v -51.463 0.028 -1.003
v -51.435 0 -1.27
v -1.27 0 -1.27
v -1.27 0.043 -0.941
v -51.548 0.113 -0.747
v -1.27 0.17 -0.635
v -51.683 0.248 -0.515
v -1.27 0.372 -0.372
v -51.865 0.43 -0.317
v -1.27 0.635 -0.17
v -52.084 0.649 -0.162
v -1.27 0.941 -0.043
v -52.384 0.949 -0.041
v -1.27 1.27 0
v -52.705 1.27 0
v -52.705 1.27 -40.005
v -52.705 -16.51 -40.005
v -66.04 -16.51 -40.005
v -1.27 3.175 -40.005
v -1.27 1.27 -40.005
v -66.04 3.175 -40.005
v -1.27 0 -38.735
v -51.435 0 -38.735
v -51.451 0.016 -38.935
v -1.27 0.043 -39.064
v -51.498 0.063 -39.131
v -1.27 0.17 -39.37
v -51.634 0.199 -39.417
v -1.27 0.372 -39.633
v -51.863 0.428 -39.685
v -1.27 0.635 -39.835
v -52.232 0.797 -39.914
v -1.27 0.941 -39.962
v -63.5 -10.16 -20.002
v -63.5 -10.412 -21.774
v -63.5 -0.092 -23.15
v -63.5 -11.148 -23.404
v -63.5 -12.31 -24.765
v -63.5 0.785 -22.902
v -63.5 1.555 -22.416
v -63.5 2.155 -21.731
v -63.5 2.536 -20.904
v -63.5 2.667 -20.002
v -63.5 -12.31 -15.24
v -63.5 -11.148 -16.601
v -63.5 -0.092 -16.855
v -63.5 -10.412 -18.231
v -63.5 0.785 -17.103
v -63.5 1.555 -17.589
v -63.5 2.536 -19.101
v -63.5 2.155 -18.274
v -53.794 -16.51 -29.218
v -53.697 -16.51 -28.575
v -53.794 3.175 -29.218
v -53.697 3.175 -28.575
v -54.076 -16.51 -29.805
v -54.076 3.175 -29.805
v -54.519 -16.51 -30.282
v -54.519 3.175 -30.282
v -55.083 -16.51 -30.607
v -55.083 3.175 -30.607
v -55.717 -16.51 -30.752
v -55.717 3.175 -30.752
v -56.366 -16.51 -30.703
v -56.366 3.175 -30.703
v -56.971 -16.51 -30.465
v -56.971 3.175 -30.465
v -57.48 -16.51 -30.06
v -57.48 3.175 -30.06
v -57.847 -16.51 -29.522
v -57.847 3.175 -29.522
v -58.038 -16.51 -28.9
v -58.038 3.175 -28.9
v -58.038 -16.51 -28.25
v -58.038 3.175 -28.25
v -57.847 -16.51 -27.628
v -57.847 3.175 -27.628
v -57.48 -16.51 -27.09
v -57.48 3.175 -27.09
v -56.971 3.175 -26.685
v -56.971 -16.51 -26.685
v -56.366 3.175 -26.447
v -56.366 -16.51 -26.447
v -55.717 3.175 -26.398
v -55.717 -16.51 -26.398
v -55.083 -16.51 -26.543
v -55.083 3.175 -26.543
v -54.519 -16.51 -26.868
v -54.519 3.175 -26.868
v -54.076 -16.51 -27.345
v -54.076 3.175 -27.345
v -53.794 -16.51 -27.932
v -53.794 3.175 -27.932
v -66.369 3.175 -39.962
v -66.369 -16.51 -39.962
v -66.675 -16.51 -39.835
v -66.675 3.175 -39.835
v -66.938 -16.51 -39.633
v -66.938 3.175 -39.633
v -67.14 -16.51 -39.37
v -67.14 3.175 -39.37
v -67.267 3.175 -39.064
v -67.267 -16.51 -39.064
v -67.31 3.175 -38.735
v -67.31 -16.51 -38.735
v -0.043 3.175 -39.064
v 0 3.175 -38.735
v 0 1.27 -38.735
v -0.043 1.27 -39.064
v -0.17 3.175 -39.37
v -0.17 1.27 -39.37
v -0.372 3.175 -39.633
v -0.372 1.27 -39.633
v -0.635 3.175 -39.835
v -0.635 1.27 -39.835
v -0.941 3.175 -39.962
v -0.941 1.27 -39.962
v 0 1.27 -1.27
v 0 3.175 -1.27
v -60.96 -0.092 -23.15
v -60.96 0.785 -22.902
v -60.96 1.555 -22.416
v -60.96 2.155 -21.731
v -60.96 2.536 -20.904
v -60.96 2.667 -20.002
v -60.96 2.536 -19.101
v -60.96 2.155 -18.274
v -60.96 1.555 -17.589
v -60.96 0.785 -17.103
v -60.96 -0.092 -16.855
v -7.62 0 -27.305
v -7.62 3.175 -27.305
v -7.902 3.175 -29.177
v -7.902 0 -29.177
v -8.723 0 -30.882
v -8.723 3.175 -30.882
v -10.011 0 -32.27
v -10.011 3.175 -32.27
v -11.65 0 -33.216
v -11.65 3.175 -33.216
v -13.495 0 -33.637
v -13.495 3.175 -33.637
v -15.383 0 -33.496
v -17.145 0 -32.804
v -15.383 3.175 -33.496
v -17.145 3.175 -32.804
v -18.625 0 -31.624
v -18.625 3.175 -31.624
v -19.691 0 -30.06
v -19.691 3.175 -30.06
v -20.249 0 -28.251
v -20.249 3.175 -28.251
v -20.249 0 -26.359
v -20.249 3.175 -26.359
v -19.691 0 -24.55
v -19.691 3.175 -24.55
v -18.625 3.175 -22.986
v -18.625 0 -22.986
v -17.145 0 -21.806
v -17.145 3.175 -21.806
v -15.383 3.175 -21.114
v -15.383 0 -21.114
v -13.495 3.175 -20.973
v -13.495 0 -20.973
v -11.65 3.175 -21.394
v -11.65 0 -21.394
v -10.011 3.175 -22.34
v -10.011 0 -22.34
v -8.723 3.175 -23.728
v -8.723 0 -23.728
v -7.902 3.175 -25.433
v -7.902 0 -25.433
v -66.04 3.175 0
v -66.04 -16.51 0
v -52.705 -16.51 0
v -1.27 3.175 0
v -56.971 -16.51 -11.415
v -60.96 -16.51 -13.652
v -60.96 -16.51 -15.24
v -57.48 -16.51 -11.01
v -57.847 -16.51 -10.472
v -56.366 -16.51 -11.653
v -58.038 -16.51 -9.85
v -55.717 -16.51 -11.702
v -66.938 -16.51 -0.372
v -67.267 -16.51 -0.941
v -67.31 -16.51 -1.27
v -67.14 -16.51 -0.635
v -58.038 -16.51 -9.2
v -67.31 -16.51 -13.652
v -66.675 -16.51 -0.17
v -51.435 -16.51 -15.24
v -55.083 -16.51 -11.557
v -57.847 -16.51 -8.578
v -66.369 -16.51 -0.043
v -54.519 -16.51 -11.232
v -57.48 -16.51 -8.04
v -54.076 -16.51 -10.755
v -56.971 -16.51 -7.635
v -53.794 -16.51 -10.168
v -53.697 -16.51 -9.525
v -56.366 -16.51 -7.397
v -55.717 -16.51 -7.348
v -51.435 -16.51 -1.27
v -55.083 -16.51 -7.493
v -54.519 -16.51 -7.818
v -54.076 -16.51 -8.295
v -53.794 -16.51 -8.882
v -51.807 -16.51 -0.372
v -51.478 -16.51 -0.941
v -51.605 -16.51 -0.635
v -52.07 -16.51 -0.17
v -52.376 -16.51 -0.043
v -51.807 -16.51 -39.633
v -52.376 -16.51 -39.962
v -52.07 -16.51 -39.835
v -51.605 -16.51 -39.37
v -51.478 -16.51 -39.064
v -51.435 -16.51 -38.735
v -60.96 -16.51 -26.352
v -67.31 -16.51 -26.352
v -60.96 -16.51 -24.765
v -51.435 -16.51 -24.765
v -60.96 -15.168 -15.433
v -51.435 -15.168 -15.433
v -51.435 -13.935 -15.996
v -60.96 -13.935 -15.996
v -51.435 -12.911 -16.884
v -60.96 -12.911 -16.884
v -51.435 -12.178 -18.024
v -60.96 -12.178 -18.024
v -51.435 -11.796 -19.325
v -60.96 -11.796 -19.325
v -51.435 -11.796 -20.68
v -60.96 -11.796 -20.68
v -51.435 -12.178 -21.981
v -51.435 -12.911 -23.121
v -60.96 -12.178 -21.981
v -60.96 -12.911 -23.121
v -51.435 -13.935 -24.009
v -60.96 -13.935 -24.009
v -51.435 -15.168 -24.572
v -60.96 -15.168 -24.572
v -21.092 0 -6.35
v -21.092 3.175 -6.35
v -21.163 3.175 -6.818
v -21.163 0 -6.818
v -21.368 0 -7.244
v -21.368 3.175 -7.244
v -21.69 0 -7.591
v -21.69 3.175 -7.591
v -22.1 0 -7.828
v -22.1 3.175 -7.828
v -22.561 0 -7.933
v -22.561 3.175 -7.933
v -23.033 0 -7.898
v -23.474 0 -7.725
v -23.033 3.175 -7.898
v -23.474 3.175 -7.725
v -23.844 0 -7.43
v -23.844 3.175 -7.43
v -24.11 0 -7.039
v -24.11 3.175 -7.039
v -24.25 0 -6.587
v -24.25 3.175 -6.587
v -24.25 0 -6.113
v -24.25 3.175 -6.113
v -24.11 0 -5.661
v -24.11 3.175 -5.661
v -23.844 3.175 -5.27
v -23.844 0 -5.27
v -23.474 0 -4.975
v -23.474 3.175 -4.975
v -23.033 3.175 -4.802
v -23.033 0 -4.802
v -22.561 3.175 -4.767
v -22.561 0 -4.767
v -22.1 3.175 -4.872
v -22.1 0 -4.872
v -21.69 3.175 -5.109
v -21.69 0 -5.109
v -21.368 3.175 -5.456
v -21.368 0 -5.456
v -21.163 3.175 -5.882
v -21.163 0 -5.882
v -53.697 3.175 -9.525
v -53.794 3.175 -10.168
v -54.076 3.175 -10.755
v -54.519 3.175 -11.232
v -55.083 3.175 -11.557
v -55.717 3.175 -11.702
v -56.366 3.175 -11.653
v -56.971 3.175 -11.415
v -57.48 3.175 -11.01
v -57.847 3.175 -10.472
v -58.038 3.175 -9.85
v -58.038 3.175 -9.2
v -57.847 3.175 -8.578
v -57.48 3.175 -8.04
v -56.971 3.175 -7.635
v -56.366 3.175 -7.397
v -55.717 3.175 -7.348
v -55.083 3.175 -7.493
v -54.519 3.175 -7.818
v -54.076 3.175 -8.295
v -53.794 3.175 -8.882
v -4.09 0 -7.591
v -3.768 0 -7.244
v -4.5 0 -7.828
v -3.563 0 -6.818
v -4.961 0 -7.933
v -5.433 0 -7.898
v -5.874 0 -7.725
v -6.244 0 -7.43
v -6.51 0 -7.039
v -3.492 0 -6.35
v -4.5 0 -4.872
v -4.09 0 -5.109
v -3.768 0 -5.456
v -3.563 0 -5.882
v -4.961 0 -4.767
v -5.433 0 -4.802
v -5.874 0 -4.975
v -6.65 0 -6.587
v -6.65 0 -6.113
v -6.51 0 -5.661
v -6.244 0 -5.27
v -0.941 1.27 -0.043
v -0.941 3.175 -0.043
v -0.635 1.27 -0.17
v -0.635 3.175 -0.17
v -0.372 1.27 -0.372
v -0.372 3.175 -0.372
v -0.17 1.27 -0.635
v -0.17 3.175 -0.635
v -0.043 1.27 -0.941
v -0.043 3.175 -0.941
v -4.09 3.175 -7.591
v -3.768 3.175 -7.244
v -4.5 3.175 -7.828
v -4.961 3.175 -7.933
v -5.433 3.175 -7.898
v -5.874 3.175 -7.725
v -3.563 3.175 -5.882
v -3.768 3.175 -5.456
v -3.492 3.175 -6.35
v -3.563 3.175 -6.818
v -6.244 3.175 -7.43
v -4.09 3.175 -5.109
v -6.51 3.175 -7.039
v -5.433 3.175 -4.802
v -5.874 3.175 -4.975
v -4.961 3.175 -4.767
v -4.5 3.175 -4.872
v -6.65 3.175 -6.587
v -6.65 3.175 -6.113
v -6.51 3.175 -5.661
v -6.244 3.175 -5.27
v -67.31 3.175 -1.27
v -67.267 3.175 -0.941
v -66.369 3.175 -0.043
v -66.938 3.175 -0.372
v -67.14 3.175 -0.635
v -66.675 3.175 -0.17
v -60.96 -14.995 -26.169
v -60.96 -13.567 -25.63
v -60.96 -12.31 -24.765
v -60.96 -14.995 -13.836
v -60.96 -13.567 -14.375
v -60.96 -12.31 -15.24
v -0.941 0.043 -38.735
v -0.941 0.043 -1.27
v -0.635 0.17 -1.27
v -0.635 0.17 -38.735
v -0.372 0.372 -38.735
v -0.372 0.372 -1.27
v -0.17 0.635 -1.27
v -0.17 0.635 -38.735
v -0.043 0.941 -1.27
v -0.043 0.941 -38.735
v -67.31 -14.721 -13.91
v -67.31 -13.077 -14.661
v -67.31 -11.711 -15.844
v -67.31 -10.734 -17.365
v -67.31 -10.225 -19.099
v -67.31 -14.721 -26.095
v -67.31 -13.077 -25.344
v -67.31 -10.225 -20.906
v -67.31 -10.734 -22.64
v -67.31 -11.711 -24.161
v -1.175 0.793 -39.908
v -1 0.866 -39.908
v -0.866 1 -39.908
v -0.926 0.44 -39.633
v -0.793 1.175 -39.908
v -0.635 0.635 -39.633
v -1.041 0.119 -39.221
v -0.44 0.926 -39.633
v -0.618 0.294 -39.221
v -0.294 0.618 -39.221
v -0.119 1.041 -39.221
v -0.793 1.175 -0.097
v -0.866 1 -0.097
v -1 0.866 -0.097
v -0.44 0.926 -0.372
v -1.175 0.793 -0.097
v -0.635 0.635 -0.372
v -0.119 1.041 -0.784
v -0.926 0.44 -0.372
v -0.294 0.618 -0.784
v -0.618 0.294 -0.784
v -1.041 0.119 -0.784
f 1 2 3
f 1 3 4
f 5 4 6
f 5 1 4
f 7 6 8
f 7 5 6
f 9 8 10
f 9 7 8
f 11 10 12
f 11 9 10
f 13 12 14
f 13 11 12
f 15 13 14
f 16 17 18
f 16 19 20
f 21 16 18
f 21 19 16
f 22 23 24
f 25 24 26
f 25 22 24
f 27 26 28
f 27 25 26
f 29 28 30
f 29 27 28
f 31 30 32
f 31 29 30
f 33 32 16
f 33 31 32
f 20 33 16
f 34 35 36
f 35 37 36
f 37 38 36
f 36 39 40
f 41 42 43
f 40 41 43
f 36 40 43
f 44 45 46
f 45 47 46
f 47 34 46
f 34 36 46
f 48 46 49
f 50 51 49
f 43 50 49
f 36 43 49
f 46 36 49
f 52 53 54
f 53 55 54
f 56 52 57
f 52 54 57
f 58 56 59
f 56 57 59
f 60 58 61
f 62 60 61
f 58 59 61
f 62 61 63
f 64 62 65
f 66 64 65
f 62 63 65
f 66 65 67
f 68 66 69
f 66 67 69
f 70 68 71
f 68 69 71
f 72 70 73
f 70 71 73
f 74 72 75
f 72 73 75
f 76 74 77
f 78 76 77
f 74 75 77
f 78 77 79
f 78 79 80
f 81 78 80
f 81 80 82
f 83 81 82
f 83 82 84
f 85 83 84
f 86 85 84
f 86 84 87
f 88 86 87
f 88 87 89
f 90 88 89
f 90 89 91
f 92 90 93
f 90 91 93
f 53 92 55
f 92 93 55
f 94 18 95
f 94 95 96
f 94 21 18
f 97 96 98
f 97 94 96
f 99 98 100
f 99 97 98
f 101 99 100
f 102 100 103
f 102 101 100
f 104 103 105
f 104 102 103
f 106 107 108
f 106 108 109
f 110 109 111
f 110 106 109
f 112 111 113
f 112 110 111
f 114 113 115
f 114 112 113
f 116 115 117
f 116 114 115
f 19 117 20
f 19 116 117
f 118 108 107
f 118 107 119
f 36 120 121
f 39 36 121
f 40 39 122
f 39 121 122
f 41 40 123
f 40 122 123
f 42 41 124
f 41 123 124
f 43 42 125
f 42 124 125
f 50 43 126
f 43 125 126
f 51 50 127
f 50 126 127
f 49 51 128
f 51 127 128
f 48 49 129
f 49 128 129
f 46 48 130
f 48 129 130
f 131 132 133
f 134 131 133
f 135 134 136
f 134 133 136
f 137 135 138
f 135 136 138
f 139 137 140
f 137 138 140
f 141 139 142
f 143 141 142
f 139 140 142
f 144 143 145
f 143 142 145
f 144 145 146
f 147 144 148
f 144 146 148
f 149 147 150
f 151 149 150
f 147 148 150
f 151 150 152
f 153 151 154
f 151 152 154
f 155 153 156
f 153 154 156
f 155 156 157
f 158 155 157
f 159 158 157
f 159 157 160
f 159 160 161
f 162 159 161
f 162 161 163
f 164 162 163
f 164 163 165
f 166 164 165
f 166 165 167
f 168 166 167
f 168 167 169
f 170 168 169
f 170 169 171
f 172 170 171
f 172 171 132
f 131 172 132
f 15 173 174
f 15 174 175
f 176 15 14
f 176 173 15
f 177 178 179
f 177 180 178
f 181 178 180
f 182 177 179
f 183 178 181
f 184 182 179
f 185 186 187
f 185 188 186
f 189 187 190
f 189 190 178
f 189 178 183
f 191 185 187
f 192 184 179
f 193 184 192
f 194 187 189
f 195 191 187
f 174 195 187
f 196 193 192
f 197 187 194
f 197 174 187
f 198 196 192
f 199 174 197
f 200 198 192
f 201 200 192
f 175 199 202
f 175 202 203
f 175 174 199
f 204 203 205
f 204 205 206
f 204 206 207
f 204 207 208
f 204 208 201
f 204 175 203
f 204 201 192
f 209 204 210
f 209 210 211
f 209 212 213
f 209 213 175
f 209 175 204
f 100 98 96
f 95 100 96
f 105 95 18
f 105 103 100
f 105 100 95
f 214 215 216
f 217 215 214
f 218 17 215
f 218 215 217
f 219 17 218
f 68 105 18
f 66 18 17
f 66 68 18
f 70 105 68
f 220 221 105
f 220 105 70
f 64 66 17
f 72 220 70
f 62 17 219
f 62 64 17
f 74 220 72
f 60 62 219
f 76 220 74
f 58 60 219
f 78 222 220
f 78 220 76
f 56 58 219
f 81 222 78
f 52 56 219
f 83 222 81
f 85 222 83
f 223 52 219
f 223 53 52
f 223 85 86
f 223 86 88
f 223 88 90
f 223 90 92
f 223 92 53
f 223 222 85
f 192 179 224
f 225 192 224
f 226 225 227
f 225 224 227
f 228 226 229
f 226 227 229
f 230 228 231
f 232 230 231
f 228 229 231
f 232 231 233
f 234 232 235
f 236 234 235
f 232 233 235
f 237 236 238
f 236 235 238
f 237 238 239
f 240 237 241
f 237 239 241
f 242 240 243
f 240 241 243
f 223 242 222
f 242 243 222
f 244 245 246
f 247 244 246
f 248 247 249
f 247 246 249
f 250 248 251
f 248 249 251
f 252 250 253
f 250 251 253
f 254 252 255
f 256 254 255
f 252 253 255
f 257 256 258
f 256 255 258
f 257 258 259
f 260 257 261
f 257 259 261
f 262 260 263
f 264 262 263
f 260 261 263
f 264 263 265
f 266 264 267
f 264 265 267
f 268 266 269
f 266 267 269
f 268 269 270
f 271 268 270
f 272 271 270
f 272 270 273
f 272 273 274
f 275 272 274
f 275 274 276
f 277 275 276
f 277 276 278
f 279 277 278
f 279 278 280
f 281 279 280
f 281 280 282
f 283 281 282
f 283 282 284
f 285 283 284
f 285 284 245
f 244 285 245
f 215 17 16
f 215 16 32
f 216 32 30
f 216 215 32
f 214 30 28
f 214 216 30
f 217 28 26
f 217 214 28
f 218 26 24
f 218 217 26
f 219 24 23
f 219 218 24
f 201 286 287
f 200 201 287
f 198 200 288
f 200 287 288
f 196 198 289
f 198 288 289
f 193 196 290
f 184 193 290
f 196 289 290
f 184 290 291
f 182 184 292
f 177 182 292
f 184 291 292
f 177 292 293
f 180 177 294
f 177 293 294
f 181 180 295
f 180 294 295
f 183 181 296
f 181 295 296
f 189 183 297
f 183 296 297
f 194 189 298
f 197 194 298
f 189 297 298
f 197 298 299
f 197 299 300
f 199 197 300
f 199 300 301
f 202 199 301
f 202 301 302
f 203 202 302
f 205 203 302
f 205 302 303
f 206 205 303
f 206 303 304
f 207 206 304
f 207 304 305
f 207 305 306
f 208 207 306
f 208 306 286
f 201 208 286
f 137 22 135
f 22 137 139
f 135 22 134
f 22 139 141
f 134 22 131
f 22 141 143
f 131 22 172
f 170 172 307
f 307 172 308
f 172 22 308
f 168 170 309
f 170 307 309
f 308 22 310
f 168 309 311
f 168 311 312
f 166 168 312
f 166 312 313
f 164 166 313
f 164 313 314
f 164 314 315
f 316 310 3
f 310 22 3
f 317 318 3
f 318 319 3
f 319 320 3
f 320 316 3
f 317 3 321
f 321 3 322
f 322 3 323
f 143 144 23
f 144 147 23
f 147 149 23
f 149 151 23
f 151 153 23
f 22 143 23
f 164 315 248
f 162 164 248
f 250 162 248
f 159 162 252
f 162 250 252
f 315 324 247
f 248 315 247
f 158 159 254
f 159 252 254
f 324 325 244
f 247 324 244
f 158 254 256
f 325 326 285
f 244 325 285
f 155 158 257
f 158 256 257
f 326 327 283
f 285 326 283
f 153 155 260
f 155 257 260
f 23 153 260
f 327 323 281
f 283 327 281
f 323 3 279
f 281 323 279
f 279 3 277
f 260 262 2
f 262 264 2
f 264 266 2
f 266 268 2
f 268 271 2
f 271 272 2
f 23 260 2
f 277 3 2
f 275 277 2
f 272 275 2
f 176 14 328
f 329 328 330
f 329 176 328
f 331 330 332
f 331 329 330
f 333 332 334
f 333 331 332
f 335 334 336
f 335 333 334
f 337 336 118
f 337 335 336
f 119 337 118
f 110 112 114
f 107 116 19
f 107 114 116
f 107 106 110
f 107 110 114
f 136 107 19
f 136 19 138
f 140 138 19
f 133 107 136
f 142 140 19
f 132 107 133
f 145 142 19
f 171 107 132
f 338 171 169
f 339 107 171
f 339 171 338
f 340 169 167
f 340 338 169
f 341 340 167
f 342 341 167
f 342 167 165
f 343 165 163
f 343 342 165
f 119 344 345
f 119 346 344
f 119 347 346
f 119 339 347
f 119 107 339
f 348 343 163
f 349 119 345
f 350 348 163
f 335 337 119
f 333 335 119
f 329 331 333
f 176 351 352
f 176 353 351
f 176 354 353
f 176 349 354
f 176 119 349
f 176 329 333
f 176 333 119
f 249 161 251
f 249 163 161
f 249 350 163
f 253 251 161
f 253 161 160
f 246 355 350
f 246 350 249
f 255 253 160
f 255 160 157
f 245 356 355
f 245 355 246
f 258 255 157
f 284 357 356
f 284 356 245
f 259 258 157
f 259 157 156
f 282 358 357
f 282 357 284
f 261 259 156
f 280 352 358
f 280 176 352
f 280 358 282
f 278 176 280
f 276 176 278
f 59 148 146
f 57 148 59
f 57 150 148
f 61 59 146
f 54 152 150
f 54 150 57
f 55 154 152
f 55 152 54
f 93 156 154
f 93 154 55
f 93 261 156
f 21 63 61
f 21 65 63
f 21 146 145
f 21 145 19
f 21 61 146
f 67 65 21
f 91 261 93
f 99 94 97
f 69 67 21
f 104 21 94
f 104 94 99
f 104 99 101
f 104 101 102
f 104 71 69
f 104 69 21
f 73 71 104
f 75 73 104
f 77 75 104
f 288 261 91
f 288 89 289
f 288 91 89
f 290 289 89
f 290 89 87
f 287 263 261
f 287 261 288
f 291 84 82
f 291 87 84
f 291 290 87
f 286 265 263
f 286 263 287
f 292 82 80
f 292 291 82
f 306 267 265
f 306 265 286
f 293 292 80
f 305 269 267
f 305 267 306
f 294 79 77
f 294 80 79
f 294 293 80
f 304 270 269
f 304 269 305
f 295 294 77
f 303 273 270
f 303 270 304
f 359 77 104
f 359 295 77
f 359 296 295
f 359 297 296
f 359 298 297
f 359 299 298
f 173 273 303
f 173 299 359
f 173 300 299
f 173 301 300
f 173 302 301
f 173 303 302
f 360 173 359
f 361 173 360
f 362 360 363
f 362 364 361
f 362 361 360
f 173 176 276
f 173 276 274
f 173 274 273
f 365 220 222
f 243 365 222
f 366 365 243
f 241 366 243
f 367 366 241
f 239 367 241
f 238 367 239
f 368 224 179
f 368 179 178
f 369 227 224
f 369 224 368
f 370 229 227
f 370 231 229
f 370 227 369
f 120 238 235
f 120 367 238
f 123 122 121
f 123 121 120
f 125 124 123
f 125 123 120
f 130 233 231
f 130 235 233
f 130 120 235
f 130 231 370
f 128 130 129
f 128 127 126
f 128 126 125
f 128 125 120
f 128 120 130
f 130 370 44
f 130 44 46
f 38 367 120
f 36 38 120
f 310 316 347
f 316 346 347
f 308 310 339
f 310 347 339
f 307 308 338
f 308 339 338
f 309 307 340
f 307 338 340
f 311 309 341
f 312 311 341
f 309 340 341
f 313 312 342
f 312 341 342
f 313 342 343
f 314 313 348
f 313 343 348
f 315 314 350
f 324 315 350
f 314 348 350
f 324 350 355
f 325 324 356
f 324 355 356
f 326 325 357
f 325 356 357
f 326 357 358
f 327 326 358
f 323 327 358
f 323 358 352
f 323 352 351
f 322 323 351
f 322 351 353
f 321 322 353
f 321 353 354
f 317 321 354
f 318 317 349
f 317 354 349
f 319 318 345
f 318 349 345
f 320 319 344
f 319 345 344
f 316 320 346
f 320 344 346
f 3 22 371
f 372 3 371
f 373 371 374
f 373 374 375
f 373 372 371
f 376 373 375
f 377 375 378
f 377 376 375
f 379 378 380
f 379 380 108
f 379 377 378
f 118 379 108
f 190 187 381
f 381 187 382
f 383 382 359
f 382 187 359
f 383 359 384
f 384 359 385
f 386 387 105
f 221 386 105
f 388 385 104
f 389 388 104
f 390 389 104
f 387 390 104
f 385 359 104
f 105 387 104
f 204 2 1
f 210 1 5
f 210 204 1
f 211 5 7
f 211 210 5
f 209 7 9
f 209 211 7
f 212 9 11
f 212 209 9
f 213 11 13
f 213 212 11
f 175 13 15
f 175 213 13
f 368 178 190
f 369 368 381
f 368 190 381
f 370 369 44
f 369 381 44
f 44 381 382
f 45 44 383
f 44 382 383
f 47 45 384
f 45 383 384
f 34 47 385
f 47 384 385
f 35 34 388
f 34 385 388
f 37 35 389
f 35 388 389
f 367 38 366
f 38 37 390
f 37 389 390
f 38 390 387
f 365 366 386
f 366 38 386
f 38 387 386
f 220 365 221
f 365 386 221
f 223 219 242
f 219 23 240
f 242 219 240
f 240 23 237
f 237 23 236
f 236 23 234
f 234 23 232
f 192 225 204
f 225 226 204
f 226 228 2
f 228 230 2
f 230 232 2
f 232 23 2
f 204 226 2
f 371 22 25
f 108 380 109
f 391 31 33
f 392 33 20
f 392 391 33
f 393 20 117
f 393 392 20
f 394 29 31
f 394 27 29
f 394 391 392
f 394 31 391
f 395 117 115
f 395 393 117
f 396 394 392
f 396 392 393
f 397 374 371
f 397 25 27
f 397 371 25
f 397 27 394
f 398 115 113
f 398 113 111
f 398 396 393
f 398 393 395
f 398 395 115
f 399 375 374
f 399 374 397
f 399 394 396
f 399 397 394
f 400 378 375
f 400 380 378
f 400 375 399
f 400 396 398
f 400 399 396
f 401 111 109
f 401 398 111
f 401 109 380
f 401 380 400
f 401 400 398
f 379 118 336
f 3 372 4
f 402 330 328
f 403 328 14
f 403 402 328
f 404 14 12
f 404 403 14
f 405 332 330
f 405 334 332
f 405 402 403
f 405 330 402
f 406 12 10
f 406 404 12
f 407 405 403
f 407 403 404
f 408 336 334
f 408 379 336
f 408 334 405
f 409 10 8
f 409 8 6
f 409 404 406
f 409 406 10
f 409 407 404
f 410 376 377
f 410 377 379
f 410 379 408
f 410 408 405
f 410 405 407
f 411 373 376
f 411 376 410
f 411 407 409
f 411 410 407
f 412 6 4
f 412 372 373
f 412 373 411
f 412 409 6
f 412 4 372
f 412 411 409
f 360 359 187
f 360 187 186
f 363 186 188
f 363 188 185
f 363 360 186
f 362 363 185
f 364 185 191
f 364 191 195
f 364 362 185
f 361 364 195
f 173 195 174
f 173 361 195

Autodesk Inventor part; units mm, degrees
ref_plane "YZ Plane" through (0, 0, 0) normal (1, 0, 0) x (0, 1, 0)
ref_plane "XZ Plane" through (0, 0, 0) normal (0, 1, 0) x (-1, 0, 0)
ref_plane "XY Plane" through (0, 0, 0) normal (0, 0, 1) x (1, 0, 0)
sketch "Sketch1" plane through (0, 0, 0) normal (0, 1, 0) x (-1, 0, 0)
  line L0 (0, 0) -> (67.31, 0)
  line L1 (67.31, 0) -> (67.31, -40.005)
  line L2 (67.31, -40.005) -> (0, -40.005)
  line L3 (0, -40.005) -> (0, 0)
  dimension "d0" = 40.005
  dimension "d1" = 67.31
extrude "Extrusion1" add sketch "Sketch1" along normal blind 3.175
sketch "Sketch2" plane through (0, 3.175, 0) normal (0, 1, 0) x (1, 0, 0)
  circle A0 centre (-13.97, 27.305) radius 6.35
  line L0 (0, 0) -> (0, 40.005) projected
  line L1 (-67.31, 0) -> (0, 0) projected
  line L2 (0, 40.005) -> (-67.31, 40.005) projected
  circle A1 centre (-5.08, 6.35) radius 1.5875
  circle A2 centre (-22.68, 6.35) radius 1.5875
  dimension "d4" = 13.97
  dimension "d28" = 12.7
  dimension "d29" = 12.7
  dimension "d30" = 3.175
  dimension "d31" = 3.175
  dimension "d32" = 5.08
  dimension "d33" = 17.6
  dimension "d34" = 6.35
  dimension "d35" = 6.35
extrude "Extrusion2" cut sketch "Sketch2" against normal blind 6.35
sketch "Sketch3" plane through (0, 0, 0) normal (0, -1, 0) x (1, 0, 0)
  line L0 (0, -40.005) -> (-67.31, -40.005) projected
  line L1 (-67.31, 0) -> (0, 0) projected
  line L2 (-67.31, -40.005) -> (-51.435, -40.005)
  line L3 (-51.435, -40.005) -> (-51.435, 0)
  line L4 (-51.435, 0) -> (-67.31, 0)
  line L5 (-67.31, 0) -> (-67.31, -40.005)
  point P0 (-67.31, 0)
  dimension "d8" = 15.875
extrude "Extrusion3" add sketch "Sketch3" along normal blind 16.51
sketch "Sketch4" plane through (-67.31, 3.175, -40.005) normal (-1, 0, 0) x (0, 0, 1)
  line L0 (40.005, -19.685) -> (0, -19.685) projected
  circle A0 centre (20.0025, -19.685) radius 6.35
  point P0 (40.005, -3.175)
  point P1 (13.6525, -19.685)
  point P2 (26.3525, -19.685)
  dimension "d11" = 12.7
extrude "Extrusion4" cut sketch "Sketch4" against normal blind 6.35 contours L0 A0 picked at (22.0577, -19.1784)
sketch "Sketch5" plane through (-60.96, 3.175, -40.005) normal (-1, 0, 0) x (0, 0, 1)
  line L0 (26.3525, -19.685) -> (13.6525, -19.685) projected
  line L1 (20.0025, -19.685) -> (20.0025, -3.683)
  circle A0 centre (20.0025, -3.683) radius 3.175
  arc A1 (26.3525, -19.685) -> (13.6525, -19.685) centre (20.0025, -19.685) ccw projected
  line L2 (24.765, -15.4849) -> (15.24, -15.4849)
  line L3 (24.765, -15.4849) -> (23.1501, -3.267)
  line L4 (15.24, -15.4849) -> (16.8549, -3.267)
  point P0 (40.005, -3.175)
  dimension "d14" = 16.002
  dimension "d15" = 6.35
  dimension "d16" = 9.525
extrude "Extrusion5" cut sketch "Sketch5" along normal blind 2.54 contours A1 L1 A0 L3 | A1 L4 A0 L1 | A0
sketch "Sketch6" plane through (0, 3.175, 0) normal (0, 1, 0) x (1, 0, 0)
  circle A0 centre (-55.88, 28.575) radius 2.1828
  circle A1 centre (-55.88, 9.525) radius 2.1828
  line L0 (-67.31, 40.005) -> (-67.31, 0) projected
  line L1 (-67.31, 0) -> (0, 0) projected
  dimension "d19" = 4.3656
  dimension "d20" = 4.3656
  dimension "d21" = 11.43
  dimension "d22" = 11.43
  dimension "d23" = 19.05
  dimension "d24" = 9.525
extrude "Extrusion6" cut sketch "Sketch6" against normal blind 25.4
fillet "Fillet1" radius 1.27 9 edges at (0, 0, -20.0025) (-25.7175, 0, 0) (-25.7175, 0, -40.005) (-51.435, -8.255, 0) (0, 1.5875, 0) (0, 1.5875, -40.005) (-67.31, -6.6675, -40.005) (-51.435, -8.255, -40.005) (-67.31, -6.6675, 0)
sketch "Sketch7" plane through (-67.31, -16.51, -20.0025) normal (-1, 0, 0) x (0, 0, 1)
  line L0 (-18.7325, 0) -> (18.7325, 0) projected
  circle A0 centre (0, 0) radius 4.7625
  point P0 (20.0025, 16.51)
  point P1 (4.7625, 0)
  point P2 (-4.7625, 0)
  dimension "d38" = 9.525
extrude "Extrusion7" cut sketch "Sketch7" against normal blind 25.4 contours A0 L0 picked at (1.1883, 1.0527)
properties part number "SwerveDriveBracket_B"
